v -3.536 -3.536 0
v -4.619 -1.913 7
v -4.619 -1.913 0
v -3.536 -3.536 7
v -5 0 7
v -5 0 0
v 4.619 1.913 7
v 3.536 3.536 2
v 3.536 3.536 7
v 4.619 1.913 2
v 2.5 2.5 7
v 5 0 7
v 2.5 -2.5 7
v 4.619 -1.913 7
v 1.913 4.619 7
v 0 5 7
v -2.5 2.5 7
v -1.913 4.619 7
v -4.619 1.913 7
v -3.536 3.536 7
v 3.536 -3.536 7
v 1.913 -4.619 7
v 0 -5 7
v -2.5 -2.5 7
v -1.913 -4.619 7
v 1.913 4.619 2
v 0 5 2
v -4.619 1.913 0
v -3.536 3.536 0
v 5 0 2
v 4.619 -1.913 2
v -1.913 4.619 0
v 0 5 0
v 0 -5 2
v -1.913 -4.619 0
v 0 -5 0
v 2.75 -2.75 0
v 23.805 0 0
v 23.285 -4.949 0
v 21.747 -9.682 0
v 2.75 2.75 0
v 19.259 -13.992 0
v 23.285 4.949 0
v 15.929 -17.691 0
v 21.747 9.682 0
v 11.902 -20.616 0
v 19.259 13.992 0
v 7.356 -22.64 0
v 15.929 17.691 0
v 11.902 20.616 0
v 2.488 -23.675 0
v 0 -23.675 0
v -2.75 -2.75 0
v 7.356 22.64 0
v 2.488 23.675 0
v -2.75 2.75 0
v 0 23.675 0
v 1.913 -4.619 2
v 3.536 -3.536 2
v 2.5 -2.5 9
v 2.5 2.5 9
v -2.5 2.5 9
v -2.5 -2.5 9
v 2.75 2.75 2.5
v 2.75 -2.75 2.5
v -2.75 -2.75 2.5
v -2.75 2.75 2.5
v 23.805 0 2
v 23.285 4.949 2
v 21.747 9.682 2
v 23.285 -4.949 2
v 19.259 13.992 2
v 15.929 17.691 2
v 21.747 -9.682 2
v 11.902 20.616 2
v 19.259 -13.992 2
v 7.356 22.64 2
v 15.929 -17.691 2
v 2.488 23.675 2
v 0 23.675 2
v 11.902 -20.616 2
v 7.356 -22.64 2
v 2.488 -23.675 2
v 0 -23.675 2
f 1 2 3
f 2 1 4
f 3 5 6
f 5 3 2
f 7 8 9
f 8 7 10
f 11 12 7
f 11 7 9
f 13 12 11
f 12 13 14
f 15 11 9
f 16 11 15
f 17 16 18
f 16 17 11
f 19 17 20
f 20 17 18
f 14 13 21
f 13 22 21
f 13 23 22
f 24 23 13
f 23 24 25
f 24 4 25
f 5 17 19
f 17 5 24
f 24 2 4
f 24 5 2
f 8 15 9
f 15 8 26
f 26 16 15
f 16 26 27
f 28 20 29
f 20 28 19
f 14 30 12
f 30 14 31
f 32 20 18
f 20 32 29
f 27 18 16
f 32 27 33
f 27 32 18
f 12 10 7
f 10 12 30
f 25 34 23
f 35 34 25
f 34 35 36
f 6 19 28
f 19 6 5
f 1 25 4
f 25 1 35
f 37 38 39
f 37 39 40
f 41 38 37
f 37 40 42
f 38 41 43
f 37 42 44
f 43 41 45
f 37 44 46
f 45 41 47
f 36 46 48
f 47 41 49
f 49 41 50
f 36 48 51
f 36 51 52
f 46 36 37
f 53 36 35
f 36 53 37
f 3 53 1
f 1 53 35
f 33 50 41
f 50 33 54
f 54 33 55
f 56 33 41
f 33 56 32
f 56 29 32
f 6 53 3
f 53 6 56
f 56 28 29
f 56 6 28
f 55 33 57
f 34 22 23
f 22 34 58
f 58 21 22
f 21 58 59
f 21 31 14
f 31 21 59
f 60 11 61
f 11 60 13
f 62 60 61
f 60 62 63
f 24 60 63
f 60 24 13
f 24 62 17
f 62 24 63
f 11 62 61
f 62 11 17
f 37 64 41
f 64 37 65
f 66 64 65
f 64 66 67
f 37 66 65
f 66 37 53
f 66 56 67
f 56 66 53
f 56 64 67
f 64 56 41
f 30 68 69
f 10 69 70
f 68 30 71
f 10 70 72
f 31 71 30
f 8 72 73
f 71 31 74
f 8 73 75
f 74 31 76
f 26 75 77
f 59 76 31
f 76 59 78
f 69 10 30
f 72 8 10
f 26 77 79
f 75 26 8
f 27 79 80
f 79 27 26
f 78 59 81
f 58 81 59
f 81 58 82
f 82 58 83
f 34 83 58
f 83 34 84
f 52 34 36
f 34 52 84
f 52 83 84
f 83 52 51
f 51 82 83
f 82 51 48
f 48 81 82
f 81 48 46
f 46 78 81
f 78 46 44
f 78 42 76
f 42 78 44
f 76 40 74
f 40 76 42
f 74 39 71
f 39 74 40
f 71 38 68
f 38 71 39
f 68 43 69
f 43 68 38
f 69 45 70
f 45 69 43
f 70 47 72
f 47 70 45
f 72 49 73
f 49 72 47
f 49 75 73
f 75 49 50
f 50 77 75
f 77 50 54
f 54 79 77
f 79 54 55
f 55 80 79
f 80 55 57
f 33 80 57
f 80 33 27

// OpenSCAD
// file: varicap.scad
capacitance = 400; // pF
num_plates = 11;
plate_gap = 5;
plate_thickness = 2;

strut_r = 5;
handle_length = 25;
leg_length = 10;
leg_separation_angle=90;

fit_gap = 0.5;
slip_gap = 1;

num_stators = floor(num_plates/2);
num_rotors = ceil(num_plates/2);
leg_angle_0 = leg_separation_angle/2;
leg_angle_1 = 360 - leg_separation_angle/2;
r = sqrt((2*plate_gap*capacitance) / ((num_plates-1)*0.2248*3.14));
//TODO: account for space missing in the centre of the plates

module semicircle () {
    difference() {
        circle(r);
        circle(strut_r-fit_gap);
        translate([r,0,0]) {
            square(2*r, true);
        }
    }
}

module washer() {
    difference() {
        circle(strut_r);
        circle(bolt_r);
    }
}

module spacer(end) {
    
    washer_len = plate_thickness + plate_gap - slip_gap/2;
    bearing_len = end ? plate_thickness*2 + plate_gap + slip_gap/2 : plate_thickness+plate_gap;
    
    difference () {
        union () {
            if (end) {
                linear_extrude (washer_len) {
                    circle (strut_r * 1.5);
                }
            }
            linear_extrude (bearing_len) {
                circle (strut_r);
            }
            translate ([0,0,bearing_len - fit_gap]) {
                linear_extrude(plate_thickness+fit_gap) {
                    square (strut_r, true);
                }
            }
        }
        
        translate ([0,0,-fit_gap]) {
            linear_extrude (plate_thickness + fit_gap*2) {
                square (strut_r+fit_gap, true);
            }
        }
    }
}
// main file
include <varicap.scad>

is_end = 0;

module rotor (end) {
    rotate ([0,0,180]) {
        union() {  
            linear_extrude (plate_thickness) {
                semicircle ();
            }
            
            spacer (end);
        }
    }
}

rotor (is_end);
